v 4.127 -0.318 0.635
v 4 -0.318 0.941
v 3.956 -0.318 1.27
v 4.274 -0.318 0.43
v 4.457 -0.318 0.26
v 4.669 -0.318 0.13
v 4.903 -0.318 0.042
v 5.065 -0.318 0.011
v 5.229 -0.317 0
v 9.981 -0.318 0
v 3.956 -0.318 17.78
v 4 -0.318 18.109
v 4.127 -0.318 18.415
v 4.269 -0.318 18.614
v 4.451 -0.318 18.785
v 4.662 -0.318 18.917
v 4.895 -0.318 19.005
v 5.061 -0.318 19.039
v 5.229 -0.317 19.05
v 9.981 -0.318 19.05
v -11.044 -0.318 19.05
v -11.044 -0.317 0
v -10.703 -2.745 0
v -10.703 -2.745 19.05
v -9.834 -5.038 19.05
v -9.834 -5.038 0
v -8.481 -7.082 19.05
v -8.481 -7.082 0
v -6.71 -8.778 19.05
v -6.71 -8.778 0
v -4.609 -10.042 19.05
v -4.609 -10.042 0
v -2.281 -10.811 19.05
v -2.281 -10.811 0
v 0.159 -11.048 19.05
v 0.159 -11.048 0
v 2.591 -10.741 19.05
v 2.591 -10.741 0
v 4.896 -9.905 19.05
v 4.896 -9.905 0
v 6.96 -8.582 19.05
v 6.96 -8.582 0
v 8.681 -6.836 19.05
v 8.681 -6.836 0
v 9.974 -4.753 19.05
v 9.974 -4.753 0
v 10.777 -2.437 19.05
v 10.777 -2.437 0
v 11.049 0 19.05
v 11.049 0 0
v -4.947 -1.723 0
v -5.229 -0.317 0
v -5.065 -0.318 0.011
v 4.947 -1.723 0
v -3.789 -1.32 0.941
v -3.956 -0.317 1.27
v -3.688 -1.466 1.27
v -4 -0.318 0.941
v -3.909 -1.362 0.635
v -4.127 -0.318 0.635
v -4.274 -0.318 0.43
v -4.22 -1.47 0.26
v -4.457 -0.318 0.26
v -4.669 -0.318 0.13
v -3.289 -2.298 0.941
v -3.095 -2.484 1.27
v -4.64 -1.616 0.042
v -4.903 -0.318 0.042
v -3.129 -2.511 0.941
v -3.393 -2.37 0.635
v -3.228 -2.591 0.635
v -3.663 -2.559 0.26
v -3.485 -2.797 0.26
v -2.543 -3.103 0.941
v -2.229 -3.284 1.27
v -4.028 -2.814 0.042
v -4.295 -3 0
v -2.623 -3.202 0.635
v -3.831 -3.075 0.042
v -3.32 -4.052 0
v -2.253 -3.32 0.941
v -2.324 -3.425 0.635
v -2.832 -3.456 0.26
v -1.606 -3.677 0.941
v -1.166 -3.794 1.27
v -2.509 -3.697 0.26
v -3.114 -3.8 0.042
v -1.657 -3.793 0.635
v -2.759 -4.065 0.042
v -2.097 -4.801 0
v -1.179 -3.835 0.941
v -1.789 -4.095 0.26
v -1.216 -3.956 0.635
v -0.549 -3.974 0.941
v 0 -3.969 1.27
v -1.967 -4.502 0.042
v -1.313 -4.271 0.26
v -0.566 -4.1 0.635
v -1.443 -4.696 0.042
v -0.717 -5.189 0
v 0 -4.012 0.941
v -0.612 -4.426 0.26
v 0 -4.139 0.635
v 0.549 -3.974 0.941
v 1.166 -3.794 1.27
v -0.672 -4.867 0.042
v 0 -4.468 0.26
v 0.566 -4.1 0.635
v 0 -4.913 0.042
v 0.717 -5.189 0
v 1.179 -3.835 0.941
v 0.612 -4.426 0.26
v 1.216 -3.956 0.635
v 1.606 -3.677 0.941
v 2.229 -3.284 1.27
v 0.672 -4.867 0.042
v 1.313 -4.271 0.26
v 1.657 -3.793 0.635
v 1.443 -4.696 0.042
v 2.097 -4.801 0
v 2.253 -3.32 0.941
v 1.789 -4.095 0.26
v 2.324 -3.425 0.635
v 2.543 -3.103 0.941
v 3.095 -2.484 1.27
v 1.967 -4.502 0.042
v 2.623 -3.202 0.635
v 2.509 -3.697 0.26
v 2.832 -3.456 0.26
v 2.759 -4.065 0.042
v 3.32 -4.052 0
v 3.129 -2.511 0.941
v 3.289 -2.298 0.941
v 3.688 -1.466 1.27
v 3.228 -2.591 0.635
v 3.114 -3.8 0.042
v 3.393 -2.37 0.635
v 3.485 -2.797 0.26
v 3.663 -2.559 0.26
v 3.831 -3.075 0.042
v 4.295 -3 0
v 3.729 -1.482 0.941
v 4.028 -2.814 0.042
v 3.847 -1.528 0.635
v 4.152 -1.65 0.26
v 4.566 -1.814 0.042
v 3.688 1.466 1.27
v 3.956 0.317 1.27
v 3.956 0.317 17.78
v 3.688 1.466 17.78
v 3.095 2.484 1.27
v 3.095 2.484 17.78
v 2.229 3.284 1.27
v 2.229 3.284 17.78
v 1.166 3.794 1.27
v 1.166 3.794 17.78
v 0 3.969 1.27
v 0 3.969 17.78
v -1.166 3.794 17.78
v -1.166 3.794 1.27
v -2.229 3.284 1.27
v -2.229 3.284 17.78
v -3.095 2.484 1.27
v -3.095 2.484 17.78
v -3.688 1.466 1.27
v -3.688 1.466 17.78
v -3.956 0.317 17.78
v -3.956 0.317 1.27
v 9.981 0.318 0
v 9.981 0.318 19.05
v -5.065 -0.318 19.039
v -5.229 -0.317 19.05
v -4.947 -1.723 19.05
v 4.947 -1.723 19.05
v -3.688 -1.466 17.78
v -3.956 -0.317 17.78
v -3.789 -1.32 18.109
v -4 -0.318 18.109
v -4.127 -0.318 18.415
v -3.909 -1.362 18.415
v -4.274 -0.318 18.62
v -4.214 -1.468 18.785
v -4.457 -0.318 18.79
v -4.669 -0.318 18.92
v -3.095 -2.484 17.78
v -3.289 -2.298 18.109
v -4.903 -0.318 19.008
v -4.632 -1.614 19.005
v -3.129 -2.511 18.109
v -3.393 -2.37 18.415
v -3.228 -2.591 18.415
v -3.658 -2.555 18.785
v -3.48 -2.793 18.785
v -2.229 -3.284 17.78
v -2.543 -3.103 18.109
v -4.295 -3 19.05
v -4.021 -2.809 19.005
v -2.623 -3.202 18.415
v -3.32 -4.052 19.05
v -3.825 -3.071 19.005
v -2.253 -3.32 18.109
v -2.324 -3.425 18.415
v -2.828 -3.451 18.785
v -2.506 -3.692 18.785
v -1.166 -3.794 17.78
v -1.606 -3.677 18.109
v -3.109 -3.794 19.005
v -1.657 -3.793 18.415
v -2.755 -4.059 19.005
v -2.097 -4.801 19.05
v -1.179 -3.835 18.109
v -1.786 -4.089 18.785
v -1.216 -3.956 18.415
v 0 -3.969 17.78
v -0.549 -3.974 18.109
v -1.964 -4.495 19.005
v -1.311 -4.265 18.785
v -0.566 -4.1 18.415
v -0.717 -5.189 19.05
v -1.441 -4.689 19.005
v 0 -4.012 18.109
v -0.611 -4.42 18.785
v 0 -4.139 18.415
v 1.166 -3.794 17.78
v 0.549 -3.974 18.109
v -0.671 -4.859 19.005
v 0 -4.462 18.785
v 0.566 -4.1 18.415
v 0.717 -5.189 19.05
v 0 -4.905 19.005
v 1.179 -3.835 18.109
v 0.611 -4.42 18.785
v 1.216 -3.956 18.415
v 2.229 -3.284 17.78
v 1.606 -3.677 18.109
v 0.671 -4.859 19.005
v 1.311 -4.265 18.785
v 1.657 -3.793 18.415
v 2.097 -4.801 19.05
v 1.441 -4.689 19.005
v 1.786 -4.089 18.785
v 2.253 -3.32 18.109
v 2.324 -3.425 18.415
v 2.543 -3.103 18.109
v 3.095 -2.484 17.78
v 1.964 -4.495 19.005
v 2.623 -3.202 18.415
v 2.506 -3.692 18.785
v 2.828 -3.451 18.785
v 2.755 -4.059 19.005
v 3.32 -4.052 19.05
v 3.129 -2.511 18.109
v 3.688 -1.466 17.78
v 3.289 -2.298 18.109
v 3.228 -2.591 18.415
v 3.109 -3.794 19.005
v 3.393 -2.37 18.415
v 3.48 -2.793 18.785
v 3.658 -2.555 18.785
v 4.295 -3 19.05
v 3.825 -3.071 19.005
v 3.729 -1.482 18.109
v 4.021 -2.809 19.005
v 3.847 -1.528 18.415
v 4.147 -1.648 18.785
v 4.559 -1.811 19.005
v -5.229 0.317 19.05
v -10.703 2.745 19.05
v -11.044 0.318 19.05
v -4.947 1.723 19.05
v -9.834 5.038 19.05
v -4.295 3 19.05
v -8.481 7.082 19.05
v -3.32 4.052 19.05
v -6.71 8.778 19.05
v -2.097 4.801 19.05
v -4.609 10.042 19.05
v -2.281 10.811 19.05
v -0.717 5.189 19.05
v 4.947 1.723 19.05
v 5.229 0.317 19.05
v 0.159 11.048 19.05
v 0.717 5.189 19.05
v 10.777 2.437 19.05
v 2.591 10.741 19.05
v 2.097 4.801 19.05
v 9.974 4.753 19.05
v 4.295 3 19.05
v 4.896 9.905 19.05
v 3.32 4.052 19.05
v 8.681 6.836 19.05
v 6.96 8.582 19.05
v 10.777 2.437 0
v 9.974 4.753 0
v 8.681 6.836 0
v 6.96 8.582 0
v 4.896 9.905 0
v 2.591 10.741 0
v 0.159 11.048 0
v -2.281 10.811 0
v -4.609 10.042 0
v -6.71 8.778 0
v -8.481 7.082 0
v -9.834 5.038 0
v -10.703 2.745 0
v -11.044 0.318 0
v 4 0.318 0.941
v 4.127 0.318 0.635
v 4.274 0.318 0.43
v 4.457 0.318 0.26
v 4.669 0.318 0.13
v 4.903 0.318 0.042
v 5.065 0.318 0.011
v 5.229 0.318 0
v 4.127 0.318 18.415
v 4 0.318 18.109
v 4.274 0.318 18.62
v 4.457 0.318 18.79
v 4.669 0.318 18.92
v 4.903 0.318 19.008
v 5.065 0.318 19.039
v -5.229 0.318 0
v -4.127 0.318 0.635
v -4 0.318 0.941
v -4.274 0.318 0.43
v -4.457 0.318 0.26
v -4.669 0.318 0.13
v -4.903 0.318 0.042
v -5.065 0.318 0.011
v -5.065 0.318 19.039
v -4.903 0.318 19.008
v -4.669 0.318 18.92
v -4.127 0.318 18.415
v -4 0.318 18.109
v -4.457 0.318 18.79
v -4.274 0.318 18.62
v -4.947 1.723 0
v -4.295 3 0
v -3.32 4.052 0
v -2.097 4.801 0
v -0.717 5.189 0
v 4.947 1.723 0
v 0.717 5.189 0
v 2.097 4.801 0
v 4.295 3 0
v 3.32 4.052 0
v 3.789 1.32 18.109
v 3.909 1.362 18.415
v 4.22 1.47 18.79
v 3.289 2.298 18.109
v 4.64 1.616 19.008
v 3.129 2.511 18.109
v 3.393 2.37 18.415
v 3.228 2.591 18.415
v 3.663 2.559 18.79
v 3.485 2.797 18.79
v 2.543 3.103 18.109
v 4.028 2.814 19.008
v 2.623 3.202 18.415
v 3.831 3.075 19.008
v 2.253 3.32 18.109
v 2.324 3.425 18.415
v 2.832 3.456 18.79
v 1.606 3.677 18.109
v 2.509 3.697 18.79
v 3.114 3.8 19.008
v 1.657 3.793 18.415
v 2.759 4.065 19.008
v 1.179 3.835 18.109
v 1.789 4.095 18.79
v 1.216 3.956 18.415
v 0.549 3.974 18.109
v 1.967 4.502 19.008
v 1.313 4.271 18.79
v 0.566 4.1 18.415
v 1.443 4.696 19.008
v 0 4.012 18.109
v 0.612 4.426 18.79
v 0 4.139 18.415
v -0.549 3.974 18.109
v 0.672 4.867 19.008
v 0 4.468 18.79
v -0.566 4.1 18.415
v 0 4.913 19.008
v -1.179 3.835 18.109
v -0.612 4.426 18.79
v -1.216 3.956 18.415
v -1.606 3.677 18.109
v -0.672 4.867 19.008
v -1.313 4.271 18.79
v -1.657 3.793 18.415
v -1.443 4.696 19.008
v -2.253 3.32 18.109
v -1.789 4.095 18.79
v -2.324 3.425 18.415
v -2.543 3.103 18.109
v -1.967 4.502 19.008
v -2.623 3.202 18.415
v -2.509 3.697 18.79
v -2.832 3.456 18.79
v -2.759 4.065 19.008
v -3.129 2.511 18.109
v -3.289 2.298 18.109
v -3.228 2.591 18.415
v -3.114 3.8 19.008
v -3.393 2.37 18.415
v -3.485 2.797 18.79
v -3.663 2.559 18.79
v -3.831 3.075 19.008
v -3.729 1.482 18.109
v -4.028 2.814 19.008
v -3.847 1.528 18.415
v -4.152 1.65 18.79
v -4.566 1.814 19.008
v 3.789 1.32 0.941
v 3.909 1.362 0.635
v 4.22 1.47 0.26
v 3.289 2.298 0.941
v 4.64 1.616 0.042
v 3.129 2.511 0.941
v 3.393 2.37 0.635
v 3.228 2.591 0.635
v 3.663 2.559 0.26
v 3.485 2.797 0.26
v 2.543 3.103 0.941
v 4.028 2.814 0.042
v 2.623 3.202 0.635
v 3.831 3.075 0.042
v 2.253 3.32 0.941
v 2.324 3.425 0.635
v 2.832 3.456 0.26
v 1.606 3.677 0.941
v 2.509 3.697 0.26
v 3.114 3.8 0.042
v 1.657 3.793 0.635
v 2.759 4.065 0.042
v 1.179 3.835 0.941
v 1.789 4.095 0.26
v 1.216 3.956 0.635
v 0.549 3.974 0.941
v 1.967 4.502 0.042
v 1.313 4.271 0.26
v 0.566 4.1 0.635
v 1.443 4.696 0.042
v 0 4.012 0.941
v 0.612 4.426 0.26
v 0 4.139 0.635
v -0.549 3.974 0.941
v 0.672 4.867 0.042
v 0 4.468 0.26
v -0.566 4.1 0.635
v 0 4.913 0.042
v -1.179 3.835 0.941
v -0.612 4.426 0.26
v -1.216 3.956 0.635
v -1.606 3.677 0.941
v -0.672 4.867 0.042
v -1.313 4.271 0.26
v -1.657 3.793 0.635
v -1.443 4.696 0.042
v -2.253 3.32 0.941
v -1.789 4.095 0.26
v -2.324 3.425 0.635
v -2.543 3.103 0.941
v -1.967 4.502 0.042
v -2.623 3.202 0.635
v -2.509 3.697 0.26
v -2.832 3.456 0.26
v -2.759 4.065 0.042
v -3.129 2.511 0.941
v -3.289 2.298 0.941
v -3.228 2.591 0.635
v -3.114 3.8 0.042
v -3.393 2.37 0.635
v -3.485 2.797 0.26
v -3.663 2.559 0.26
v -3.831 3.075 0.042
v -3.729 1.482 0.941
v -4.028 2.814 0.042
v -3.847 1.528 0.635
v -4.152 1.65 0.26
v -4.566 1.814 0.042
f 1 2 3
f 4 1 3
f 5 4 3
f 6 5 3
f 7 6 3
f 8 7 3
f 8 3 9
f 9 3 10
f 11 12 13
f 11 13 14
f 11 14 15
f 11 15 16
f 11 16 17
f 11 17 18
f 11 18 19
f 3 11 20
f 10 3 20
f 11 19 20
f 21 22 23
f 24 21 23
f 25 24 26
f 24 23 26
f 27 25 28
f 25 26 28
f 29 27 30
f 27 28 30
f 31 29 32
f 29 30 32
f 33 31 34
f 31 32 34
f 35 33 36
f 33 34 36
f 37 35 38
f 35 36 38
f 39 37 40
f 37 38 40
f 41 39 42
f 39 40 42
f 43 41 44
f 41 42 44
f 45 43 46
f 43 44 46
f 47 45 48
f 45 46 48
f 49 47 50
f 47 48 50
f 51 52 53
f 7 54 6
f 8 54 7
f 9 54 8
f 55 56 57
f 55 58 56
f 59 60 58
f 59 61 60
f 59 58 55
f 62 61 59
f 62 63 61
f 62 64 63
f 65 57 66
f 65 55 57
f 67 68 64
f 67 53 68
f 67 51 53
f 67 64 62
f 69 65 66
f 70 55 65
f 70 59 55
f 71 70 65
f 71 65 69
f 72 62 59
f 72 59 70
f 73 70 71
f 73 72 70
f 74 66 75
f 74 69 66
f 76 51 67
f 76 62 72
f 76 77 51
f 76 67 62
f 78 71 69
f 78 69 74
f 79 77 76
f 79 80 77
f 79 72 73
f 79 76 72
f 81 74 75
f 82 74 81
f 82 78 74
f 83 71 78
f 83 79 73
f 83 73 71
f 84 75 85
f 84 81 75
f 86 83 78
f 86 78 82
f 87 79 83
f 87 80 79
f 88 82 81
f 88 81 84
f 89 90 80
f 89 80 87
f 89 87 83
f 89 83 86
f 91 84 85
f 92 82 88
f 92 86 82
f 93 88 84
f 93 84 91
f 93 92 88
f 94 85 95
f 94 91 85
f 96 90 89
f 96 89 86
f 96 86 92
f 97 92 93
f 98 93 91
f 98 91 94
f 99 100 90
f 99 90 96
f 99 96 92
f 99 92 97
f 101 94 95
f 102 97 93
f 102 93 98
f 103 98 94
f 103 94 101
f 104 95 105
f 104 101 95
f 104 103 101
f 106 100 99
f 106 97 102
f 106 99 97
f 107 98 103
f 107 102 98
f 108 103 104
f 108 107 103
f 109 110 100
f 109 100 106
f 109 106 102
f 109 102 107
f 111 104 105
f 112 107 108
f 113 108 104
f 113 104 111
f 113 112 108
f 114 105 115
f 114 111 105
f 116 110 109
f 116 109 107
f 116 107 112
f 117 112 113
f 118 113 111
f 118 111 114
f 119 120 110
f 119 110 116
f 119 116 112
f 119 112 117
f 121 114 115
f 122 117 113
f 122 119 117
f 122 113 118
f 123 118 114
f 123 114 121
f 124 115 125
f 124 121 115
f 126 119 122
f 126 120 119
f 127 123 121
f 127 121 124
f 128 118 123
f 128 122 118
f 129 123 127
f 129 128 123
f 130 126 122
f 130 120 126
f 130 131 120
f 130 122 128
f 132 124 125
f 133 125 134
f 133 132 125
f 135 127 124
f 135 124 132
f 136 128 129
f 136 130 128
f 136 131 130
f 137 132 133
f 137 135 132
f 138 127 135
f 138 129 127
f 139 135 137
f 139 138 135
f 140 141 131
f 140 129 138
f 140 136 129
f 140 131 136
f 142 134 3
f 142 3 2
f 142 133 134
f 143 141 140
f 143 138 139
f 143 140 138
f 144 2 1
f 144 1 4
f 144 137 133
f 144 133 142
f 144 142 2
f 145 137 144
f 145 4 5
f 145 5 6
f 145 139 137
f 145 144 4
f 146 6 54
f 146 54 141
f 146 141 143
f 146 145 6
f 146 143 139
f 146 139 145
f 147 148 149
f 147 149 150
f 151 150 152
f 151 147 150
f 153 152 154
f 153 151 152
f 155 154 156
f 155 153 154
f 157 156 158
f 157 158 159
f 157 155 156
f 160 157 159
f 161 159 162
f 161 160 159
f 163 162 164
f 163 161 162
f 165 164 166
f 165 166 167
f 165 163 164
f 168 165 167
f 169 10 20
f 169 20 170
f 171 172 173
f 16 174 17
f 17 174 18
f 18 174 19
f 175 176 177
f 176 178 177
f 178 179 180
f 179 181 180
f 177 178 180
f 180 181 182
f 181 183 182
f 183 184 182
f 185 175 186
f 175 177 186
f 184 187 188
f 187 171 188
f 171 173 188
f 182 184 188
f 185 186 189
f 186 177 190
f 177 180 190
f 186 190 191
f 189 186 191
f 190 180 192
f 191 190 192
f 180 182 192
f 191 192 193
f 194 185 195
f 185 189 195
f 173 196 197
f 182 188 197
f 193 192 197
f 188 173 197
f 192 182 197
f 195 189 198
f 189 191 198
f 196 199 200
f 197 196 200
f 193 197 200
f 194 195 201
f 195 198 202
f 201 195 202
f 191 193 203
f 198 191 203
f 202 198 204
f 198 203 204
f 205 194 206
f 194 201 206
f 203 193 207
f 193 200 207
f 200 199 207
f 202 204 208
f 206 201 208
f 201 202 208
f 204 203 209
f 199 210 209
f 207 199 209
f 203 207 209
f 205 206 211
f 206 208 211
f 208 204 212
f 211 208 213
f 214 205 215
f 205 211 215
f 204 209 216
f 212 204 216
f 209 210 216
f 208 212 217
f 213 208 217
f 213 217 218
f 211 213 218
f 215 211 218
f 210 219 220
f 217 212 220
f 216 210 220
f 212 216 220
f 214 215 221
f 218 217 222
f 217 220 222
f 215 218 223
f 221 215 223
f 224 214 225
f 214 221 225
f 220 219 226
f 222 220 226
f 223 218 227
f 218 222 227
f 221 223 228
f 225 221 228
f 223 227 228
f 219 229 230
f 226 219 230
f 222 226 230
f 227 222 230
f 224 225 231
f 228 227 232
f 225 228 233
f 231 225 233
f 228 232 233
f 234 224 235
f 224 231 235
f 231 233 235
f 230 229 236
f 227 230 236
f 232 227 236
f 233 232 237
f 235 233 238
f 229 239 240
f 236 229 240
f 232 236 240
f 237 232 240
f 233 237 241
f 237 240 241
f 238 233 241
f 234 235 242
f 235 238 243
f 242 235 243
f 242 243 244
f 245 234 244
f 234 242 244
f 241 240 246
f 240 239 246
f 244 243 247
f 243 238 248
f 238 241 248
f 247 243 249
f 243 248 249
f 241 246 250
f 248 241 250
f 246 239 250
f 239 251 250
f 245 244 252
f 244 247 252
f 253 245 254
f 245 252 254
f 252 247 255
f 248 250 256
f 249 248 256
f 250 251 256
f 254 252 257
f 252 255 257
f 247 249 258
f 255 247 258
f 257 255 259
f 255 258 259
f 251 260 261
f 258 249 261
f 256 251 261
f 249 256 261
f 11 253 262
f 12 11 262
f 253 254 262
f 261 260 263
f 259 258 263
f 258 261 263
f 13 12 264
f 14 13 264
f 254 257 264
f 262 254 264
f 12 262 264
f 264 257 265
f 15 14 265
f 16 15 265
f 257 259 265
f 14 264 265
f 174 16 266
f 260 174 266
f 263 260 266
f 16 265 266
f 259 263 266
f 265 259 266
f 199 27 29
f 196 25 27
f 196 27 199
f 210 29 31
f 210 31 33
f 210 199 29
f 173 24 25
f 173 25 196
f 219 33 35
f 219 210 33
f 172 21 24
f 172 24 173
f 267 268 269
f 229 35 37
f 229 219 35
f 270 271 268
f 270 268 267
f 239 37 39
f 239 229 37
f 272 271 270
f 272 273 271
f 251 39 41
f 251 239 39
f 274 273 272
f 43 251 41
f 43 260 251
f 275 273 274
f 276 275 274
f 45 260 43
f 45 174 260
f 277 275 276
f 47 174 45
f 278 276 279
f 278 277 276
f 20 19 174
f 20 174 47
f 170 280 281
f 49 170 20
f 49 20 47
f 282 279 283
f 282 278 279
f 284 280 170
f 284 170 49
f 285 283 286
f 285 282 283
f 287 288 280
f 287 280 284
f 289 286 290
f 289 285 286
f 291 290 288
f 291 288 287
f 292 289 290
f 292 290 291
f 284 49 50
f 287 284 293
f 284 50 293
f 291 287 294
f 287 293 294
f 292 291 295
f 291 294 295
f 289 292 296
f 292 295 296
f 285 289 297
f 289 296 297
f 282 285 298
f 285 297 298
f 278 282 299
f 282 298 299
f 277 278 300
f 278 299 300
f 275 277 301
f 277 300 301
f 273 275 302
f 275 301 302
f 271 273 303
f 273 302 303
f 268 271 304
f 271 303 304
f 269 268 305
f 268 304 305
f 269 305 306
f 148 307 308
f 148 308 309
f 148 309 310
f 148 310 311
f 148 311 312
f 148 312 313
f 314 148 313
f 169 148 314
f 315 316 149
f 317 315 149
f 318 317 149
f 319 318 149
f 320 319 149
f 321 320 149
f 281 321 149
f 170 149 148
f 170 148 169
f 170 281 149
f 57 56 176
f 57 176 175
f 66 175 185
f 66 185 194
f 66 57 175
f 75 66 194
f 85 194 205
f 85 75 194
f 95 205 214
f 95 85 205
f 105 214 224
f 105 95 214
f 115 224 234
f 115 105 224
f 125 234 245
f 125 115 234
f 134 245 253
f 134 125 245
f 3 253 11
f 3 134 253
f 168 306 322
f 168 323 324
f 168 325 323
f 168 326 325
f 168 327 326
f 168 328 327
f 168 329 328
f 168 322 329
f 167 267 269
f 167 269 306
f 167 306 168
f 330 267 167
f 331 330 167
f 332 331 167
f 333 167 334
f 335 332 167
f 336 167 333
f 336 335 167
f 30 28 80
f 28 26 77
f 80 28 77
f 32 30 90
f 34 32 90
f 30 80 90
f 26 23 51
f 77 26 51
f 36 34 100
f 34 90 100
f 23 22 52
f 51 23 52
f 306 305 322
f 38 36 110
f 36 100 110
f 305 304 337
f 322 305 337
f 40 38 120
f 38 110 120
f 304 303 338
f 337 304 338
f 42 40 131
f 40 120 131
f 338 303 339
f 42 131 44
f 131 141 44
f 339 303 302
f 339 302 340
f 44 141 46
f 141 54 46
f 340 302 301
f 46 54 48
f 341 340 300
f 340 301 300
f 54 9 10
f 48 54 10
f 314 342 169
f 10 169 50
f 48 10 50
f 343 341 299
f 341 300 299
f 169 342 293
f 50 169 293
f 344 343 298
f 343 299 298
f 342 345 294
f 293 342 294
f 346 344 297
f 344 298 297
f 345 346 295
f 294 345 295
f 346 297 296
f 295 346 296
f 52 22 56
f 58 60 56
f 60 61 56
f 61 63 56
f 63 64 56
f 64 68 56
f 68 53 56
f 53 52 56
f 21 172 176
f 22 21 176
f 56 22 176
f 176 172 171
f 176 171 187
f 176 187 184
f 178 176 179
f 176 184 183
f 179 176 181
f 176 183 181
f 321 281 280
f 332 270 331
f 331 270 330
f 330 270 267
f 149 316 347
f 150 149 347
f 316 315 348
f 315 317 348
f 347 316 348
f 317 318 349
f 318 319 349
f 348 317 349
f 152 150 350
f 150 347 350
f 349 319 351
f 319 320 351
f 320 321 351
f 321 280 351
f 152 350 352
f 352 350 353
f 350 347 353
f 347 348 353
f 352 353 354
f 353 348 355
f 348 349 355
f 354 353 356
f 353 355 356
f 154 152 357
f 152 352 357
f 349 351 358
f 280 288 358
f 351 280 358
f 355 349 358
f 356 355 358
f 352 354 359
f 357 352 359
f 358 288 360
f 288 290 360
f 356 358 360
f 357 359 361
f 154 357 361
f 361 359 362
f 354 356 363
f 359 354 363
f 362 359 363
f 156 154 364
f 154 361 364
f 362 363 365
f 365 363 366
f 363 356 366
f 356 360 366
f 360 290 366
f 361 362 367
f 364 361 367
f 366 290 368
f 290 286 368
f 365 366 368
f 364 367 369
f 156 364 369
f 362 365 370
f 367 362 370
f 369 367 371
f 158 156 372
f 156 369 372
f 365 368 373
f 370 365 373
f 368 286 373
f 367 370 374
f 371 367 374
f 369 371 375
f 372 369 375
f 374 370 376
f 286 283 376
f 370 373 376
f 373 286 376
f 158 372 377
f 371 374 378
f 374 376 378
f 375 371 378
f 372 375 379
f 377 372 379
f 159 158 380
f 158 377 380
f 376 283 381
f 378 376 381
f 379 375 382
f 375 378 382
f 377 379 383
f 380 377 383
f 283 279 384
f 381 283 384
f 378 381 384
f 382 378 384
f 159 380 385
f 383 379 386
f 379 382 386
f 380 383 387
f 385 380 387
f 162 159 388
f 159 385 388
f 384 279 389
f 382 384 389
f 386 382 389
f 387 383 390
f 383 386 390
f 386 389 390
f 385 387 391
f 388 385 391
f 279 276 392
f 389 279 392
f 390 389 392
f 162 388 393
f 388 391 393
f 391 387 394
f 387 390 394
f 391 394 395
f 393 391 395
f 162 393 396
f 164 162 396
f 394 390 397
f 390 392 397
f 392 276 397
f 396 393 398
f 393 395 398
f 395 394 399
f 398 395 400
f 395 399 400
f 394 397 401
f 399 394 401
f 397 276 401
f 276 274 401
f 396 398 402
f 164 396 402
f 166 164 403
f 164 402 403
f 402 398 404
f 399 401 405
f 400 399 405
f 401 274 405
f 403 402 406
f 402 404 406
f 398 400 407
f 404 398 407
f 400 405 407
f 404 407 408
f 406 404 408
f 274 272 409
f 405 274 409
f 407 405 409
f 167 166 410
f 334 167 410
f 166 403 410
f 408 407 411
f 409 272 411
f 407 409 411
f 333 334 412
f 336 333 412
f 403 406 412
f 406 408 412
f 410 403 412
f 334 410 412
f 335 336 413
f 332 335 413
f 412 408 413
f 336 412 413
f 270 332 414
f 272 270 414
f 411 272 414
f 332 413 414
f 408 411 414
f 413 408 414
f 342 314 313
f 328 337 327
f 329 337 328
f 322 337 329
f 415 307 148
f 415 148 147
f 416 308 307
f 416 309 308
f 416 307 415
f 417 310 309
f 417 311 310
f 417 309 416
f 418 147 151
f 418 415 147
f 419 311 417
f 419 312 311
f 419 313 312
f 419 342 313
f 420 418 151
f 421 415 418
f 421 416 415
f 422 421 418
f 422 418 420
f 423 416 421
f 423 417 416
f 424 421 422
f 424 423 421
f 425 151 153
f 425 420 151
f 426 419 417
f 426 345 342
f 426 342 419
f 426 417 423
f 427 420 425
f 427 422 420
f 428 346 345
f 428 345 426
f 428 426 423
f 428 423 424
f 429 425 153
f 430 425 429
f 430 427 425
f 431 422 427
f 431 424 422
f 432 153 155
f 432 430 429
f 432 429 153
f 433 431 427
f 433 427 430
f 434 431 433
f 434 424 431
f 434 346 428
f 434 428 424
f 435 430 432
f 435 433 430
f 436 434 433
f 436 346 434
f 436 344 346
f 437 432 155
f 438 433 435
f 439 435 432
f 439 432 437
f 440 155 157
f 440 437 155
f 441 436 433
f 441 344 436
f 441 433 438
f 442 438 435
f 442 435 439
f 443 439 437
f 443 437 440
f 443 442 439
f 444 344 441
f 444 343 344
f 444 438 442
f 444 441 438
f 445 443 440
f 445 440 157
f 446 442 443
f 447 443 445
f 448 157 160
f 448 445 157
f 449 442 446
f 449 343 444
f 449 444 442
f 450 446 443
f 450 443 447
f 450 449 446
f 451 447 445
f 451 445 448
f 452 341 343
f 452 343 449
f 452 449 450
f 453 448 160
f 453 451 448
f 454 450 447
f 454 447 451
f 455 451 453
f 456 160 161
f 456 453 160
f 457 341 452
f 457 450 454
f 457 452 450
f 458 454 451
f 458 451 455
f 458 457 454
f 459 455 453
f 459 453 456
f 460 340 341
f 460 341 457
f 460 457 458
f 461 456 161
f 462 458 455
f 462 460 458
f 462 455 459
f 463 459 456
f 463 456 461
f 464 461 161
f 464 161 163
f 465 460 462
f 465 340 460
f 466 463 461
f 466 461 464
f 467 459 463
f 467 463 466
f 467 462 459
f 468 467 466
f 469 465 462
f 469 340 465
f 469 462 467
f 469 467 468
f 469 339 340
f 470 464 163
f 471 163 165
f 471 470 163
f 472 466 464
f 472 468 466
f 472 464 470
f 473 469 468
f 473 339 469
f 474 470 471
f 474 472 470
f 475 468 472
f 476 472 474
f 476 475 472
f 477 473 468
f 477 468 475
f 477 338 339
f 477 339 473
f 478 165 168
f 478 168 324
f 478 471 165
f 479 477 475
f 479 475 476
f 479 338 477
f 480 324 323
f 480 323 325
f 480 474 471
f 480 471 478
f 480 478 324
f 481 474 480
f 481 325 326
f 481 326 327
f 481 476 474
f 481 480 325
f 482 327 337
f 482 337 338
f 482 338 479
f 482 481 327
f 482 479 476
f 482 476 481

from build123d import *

# Parameters (mm, degrees)
SKETCH1_R           = 11.049
SKETCH1_R_2         = 3.96875
BOSS_EXTRUDE1_DEPTH = 19.05
FILLET1_R           = 1.27
SKETCH3_W           = 21.529859436
SKETCH3_H           = 0.635
CUT_EXTRUDE1_DEPTH  = 20.05


with BuildPart() as part:
    # Sketch1 → Boss-Extrude1 (new body)
    with BuildSketch(Plane.XY):
        Circle(SKETCH1_R)
        Circle(SKETCH1_R_2, mode=Mode.SUBTRACT)
    extrude(amount=BOSS_EXTRUDE1_DEPTH)

    # Fillet1
    fillet1_edges = [part.edges().sort_by_distance(p)[0] for p in [
        (-3.96875, 0, 0),
        (-3.96875, 0, 19.05),
    ]]
    fillet(fillet1_edges, radius=FILLET1_R)

    # Sketch3 → Cut-Extrude1 (cut, through all)
    with BuildSketch(Plane.XY.offset(19.05)):
        with Locations((-0.784069021, 0)):
            Rectangle(SKETCH3_W, SKETCH3_H)
    extrude(amount=-CUT_EXTRUDE1_DEPTH, mode=Mode.SUBTRACT)


solid = part.part
